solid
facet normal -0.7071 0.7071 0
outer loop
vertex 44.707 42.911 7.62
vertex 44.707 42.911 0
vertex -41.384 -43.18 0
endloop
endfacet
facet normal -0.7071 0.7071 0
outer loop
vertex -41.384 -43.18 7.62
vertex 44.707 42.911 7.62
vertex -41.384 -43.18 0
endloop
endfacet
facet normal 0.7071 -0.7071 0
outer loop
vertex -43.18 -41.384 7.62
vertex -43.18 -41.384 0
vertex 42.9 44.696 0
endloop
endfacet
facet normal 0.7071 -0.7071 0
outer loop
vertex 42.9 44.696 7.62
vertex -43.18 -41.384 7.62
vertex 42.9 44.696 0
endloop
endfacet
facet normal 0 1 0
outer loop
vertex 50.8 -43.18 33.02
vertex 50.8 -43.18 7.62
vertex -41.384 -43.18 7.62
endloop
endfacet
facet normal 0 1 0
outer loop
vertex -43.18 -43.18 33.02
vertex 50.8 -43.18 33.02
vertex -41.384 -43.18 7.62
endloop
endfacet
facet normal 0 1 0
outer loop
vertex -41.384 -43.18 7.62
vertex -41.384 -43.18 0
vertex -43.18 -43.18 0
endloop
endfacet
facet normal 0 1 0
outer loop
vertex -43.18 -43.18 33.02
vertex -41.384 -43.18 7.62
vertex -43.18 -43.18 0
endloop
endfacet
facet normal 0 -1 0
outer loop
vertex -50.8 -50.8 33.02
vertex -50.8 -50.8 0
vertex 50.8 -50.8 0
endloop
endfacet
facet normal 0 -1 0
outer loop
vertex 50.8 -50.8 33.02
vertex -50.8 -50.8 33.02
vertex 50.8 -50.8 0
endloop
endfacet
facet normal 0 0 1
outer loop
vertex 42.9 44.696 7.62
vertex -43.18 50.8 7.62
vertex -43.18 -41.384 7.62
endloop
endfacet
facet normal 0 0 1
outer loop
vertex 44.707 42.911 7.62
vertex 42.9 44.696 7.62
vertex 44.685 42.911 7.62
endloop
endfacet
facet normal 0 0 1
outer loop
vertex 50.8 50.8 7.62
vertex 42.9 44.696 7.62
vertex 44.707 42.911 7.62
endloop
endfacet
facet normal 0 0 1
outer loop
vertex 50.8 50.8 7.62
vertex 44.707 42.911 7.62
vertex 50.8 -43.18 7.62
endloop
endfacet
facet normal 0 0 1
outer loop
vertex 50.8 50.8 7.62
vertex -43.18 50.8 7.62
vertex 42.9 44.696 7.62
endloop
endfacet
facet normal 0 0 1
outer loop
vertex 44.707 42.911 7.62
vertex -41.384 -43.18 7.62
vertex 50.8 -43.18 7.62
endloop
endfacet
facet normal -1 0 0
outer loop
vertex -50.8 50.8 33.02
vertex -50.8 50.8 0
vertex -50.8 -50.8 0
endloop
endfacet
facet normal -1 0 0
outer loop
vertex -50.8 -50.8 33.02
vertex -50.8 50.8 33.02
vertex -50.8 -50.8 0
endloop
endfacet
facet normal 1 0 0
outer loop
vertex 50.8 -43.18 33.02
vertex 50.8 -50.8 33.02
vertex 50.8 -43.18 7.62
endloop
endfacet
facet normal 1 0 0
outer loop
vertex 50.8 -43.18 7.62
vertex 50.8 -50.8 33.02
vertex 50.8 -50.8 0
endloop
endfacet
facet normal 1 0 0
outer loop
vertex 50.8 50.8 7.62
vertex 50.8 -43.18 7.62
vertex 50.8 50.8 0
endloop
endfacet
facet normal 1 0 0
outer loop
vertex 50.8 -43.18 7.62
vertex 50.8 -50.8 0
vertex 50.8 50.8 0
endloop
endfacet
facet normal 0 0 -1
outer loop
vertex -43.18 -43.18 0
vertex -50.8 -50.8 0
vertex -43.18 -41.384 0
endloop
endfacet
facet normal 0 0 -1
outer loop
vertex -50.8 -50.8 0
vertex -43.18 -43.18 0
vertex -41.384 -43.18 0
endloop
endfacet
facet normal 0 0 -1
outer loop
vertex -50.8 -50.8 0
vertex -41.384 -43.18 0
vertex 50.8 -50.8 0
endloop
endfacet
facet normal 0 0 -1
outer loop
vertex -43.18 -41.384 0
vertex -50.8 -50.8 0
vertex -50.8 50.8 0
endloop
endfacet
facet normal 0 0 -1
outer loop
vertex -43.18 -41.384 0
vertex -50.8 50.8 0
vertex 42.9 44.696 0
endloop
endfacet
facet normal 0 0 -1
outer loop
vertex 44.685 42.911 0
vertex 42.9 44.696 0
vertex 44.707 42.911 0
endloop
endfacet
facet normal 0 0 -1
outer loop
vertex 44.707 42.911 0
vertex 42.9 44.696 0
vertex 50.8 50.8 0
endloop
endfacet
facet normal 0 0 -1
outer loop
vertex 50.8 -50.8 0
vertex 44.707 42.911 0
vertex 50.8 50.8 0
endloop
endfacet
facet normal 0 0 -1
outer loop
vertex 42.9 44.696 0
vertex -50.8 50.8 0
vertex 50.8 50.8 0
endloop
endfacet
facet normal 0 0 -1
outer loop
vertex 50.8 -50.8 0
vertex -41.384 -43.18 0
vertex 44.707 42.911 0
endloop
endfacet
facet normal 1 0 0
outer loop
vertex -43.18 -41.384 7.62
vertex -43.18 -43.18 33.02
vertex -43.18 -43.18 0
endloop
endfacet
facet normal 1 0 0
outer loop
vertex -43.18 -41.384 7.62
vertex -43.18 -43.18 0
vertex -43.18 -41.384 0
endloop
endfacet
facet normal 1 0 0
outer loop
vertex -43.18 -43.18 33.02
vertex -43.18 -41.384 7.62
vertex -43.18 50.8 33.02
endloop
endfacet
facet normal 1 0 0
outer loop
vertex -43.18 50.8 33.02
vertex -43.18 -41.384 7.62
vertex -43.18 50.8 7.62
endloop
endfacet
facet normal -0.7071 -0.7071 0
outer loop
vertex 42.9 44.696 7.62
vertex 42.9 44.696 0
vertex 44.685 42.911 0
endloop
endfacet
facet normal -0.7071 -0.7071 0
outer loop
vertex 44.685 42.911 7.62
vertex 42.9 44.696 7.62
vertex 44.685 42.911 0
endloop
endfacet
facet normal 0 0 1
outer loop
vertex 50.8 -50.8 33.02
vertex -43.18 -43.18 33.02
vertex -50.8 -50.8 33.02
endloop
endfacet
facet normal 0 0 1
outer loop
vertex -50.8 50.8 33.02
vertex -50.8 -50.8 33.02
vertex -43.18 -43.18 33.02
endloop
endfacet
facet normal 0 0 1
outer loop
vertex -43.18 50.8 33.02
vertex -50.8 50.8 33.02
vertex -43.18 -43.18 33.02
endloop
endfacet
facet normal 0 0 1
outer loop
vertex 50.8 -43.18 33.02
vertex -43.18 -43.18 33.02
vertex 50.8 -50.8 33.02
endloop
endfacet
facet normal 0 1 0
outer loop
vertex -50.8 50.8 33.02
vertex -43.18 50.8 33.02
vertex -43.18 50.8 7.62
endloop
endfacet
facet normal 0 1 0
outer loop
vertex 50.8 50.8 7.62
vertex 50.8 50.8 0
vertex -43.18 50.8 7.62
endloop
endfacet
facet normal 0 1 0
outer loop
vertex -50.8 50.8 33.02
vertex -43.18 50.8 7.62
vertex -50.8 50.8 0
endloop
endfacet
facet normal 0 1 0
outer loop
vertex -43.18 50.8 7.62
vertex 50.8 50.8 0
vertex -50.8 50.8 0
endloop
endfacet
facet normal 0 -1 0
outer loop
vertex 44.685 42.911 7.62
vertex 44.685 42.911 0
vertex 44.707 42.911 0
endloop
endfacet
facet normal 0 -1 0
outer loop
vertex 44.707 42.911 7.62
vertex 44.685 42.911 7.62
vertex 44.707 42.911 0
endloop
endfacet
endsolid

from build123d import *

# Parameters (mm, degrees)
F1_DEPTH = 7.62
F3_DEPTH = 25.4


with BuildPart() as f1:
    # F0 (on Top) → F1 (new body)
    with BuildSketch(Plane.XY):
        Polygon((-43.18, -50.8), (50.8, -50.8), (50.8, -43.18), (-41.383949, -43.18), (-43.18, -43.18), align=None)
        Polygon((-49.003949, -50.8), (-43.18, -50.8), (-43.18, -43.18), (-50.8, -43.18), (-50.8, -49.003949), (-50.8, -50.8), align=None)
        Polygon((-41.383949, -43.18), (50.8, -43.18), (50.8, 42.910773), (50.8, 49.003949), (44.706825, 42.910773), align=None)
        Polygon((-50.8, -43.18), (-43.18, -43.18), (-43.18, -41.383949), (-43.18, 50.8), (-50.8, 50.8), align=None)
        Polygon((-43.18, 50.8), (-43.18, -41.383949), (42.9001, 44.696152), (49.003949, 50.8), (42.9001, 50.8), align=None)
        Polygon((44.706825, 42.910773), (50.8, 49.003949), (50.8, 50.8), (49.003949, 50.8), (42.9001, 44.696152), (44.685479, 42.910773), align=None)
    extrude(amount=F1_DEPTH)

    # F2 (on face) → F3 (join)
    with BuildSketch(Plane.XY.offset(7.62)):
        Polygon((-50.8, -43.18), (-50.8, -50.8), (-43.18, -50.8), (50.8, -50.8), (50.8, -43.18), (-41.383949, -43.18), (-43.18, -43.18), (-43.18, -41.383949), (-43.18, 50.8), (-50.8, 50.8), align=None)
    extrude(amount=F3_DEPTH)


solid = f1.part
